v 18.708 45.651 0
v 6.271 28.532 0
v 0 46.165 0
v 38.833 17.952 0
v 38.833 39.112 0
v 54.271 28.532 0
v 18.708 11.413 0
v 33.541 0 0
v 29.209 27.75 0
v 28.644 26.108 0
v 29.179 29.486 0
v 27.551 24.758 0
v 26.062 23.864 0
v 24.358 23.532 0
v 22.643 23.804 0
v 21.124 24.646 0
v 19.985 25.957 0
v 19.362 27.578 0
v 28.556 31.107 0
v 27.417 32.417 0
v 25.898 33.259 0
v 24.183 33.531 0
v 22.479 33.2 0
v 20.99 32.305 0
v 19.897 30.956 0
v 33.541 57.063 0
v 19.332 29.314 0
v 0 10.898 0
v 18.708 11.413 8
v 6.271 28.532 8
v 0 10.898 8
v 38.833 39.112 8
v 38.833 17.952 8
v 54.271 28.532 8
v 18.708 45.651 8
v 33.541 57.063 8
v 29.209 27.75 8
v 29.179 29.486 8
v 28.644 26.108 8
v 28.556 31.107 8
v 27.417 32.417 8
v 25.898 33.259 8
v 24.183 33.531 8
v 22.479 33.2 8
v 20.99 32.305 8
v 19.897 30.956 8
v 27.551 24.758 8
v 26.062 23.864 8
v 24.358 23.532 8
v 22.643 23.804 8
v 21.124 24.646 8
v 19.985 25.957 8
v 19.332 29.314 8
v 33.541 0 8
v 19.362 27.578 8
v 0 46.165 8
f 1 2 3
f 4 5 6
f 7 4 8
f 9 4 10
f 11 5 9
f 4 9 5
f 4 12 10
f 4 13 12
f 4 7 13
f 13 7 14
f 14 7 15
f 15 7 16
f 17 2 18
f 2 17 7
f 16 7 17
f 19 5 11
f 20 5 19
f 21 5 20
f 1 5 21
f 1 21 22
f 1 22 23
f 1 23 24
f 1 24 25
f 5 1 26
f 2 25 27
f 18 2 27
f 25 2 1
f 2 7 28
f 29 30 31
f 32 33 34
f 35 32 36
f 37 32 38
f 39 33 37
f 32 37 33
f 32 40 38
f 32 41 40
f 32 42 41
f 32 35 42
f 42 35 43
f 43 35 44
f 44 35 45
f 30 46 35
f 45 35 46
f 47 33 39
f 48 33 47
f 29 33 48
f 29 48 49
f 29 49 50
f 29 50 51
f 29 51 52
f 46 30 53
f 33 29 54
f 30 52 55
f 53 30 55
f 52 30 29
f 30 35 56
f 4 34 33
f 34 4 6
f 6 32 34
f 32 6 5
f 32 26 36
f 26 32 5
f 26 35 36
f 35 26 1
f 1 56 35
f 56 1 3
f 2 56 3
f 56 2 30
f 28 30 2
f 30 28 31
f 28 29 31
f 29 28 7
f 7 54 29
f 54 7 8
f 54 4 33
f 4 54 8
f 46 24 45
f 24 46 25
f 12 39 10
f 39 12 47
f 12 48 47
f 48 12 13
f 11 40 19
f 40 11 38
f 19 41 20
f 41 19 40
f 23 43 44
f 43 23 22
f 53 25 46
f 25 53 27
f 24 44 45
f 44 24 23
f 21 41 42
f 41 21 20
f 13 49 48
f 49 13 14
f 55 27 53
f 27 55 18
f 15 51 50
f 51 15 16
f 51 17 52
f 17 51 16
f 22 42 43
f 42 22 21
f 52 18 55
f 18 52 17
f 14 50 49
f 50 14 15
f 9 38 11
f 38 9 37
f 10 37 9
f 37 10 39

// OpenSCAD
$fn = 32;

// ----------------------------------------------------------------------
// Star wheel: 5-point blunt, R30
// ----------------------------------------------------------------------

// --- parameters (mm) ---
n_points = 5;             // number of points / teeth
r_out = 30;               // tip radius
r_in = 18;                // root radius
bore_r = 5;               // centre bore radius
plate_t = 8;              // plate thickness, Z (extrusion height)
bore_d = 10;              // centre bore diameter
fit_tol = 0.05;           // declared fit tolerance (prompt contract)
free_tol = 0.2;           // declared free tolerance (prompt contract)

profile = [[54.271, 28.532], [38.833, 39.112], [33.541, 57.063], [18.708, 45.651], [0, 46.165], [6.271, 28.532], [0, 10.898], [18.708, 11.413], [33.541, 0], [38.833, 17.952]];  // primary outline, 10 points, counter clockwise
void_1 = [[29.179, 29.486], [28.556, 31.107], [27.417, 32.417], [25.898, 33.259], [24.183, 33.531], [22.479, 33.2], [20.99, 32.305], [19.897, 30.956], [19.332, 29.314], [19.362, 27.578], [19.985, 25.957], [21.124, 24.646], [22.643, 23.804], [24.358, 23.532], [26.062, 23.864], [27.551, 24.758], [28.644, 26.108], [29.209, 27.75]];  // centre bore, 18 points

// --- the one profile operation ---
difference() {
  linear_extrude(height = plate_t) polygon(points = profile);
  translate([0, 0, -1])
    linear_extrude(height = plate_t + 2) polygon(points = void_1);
}
